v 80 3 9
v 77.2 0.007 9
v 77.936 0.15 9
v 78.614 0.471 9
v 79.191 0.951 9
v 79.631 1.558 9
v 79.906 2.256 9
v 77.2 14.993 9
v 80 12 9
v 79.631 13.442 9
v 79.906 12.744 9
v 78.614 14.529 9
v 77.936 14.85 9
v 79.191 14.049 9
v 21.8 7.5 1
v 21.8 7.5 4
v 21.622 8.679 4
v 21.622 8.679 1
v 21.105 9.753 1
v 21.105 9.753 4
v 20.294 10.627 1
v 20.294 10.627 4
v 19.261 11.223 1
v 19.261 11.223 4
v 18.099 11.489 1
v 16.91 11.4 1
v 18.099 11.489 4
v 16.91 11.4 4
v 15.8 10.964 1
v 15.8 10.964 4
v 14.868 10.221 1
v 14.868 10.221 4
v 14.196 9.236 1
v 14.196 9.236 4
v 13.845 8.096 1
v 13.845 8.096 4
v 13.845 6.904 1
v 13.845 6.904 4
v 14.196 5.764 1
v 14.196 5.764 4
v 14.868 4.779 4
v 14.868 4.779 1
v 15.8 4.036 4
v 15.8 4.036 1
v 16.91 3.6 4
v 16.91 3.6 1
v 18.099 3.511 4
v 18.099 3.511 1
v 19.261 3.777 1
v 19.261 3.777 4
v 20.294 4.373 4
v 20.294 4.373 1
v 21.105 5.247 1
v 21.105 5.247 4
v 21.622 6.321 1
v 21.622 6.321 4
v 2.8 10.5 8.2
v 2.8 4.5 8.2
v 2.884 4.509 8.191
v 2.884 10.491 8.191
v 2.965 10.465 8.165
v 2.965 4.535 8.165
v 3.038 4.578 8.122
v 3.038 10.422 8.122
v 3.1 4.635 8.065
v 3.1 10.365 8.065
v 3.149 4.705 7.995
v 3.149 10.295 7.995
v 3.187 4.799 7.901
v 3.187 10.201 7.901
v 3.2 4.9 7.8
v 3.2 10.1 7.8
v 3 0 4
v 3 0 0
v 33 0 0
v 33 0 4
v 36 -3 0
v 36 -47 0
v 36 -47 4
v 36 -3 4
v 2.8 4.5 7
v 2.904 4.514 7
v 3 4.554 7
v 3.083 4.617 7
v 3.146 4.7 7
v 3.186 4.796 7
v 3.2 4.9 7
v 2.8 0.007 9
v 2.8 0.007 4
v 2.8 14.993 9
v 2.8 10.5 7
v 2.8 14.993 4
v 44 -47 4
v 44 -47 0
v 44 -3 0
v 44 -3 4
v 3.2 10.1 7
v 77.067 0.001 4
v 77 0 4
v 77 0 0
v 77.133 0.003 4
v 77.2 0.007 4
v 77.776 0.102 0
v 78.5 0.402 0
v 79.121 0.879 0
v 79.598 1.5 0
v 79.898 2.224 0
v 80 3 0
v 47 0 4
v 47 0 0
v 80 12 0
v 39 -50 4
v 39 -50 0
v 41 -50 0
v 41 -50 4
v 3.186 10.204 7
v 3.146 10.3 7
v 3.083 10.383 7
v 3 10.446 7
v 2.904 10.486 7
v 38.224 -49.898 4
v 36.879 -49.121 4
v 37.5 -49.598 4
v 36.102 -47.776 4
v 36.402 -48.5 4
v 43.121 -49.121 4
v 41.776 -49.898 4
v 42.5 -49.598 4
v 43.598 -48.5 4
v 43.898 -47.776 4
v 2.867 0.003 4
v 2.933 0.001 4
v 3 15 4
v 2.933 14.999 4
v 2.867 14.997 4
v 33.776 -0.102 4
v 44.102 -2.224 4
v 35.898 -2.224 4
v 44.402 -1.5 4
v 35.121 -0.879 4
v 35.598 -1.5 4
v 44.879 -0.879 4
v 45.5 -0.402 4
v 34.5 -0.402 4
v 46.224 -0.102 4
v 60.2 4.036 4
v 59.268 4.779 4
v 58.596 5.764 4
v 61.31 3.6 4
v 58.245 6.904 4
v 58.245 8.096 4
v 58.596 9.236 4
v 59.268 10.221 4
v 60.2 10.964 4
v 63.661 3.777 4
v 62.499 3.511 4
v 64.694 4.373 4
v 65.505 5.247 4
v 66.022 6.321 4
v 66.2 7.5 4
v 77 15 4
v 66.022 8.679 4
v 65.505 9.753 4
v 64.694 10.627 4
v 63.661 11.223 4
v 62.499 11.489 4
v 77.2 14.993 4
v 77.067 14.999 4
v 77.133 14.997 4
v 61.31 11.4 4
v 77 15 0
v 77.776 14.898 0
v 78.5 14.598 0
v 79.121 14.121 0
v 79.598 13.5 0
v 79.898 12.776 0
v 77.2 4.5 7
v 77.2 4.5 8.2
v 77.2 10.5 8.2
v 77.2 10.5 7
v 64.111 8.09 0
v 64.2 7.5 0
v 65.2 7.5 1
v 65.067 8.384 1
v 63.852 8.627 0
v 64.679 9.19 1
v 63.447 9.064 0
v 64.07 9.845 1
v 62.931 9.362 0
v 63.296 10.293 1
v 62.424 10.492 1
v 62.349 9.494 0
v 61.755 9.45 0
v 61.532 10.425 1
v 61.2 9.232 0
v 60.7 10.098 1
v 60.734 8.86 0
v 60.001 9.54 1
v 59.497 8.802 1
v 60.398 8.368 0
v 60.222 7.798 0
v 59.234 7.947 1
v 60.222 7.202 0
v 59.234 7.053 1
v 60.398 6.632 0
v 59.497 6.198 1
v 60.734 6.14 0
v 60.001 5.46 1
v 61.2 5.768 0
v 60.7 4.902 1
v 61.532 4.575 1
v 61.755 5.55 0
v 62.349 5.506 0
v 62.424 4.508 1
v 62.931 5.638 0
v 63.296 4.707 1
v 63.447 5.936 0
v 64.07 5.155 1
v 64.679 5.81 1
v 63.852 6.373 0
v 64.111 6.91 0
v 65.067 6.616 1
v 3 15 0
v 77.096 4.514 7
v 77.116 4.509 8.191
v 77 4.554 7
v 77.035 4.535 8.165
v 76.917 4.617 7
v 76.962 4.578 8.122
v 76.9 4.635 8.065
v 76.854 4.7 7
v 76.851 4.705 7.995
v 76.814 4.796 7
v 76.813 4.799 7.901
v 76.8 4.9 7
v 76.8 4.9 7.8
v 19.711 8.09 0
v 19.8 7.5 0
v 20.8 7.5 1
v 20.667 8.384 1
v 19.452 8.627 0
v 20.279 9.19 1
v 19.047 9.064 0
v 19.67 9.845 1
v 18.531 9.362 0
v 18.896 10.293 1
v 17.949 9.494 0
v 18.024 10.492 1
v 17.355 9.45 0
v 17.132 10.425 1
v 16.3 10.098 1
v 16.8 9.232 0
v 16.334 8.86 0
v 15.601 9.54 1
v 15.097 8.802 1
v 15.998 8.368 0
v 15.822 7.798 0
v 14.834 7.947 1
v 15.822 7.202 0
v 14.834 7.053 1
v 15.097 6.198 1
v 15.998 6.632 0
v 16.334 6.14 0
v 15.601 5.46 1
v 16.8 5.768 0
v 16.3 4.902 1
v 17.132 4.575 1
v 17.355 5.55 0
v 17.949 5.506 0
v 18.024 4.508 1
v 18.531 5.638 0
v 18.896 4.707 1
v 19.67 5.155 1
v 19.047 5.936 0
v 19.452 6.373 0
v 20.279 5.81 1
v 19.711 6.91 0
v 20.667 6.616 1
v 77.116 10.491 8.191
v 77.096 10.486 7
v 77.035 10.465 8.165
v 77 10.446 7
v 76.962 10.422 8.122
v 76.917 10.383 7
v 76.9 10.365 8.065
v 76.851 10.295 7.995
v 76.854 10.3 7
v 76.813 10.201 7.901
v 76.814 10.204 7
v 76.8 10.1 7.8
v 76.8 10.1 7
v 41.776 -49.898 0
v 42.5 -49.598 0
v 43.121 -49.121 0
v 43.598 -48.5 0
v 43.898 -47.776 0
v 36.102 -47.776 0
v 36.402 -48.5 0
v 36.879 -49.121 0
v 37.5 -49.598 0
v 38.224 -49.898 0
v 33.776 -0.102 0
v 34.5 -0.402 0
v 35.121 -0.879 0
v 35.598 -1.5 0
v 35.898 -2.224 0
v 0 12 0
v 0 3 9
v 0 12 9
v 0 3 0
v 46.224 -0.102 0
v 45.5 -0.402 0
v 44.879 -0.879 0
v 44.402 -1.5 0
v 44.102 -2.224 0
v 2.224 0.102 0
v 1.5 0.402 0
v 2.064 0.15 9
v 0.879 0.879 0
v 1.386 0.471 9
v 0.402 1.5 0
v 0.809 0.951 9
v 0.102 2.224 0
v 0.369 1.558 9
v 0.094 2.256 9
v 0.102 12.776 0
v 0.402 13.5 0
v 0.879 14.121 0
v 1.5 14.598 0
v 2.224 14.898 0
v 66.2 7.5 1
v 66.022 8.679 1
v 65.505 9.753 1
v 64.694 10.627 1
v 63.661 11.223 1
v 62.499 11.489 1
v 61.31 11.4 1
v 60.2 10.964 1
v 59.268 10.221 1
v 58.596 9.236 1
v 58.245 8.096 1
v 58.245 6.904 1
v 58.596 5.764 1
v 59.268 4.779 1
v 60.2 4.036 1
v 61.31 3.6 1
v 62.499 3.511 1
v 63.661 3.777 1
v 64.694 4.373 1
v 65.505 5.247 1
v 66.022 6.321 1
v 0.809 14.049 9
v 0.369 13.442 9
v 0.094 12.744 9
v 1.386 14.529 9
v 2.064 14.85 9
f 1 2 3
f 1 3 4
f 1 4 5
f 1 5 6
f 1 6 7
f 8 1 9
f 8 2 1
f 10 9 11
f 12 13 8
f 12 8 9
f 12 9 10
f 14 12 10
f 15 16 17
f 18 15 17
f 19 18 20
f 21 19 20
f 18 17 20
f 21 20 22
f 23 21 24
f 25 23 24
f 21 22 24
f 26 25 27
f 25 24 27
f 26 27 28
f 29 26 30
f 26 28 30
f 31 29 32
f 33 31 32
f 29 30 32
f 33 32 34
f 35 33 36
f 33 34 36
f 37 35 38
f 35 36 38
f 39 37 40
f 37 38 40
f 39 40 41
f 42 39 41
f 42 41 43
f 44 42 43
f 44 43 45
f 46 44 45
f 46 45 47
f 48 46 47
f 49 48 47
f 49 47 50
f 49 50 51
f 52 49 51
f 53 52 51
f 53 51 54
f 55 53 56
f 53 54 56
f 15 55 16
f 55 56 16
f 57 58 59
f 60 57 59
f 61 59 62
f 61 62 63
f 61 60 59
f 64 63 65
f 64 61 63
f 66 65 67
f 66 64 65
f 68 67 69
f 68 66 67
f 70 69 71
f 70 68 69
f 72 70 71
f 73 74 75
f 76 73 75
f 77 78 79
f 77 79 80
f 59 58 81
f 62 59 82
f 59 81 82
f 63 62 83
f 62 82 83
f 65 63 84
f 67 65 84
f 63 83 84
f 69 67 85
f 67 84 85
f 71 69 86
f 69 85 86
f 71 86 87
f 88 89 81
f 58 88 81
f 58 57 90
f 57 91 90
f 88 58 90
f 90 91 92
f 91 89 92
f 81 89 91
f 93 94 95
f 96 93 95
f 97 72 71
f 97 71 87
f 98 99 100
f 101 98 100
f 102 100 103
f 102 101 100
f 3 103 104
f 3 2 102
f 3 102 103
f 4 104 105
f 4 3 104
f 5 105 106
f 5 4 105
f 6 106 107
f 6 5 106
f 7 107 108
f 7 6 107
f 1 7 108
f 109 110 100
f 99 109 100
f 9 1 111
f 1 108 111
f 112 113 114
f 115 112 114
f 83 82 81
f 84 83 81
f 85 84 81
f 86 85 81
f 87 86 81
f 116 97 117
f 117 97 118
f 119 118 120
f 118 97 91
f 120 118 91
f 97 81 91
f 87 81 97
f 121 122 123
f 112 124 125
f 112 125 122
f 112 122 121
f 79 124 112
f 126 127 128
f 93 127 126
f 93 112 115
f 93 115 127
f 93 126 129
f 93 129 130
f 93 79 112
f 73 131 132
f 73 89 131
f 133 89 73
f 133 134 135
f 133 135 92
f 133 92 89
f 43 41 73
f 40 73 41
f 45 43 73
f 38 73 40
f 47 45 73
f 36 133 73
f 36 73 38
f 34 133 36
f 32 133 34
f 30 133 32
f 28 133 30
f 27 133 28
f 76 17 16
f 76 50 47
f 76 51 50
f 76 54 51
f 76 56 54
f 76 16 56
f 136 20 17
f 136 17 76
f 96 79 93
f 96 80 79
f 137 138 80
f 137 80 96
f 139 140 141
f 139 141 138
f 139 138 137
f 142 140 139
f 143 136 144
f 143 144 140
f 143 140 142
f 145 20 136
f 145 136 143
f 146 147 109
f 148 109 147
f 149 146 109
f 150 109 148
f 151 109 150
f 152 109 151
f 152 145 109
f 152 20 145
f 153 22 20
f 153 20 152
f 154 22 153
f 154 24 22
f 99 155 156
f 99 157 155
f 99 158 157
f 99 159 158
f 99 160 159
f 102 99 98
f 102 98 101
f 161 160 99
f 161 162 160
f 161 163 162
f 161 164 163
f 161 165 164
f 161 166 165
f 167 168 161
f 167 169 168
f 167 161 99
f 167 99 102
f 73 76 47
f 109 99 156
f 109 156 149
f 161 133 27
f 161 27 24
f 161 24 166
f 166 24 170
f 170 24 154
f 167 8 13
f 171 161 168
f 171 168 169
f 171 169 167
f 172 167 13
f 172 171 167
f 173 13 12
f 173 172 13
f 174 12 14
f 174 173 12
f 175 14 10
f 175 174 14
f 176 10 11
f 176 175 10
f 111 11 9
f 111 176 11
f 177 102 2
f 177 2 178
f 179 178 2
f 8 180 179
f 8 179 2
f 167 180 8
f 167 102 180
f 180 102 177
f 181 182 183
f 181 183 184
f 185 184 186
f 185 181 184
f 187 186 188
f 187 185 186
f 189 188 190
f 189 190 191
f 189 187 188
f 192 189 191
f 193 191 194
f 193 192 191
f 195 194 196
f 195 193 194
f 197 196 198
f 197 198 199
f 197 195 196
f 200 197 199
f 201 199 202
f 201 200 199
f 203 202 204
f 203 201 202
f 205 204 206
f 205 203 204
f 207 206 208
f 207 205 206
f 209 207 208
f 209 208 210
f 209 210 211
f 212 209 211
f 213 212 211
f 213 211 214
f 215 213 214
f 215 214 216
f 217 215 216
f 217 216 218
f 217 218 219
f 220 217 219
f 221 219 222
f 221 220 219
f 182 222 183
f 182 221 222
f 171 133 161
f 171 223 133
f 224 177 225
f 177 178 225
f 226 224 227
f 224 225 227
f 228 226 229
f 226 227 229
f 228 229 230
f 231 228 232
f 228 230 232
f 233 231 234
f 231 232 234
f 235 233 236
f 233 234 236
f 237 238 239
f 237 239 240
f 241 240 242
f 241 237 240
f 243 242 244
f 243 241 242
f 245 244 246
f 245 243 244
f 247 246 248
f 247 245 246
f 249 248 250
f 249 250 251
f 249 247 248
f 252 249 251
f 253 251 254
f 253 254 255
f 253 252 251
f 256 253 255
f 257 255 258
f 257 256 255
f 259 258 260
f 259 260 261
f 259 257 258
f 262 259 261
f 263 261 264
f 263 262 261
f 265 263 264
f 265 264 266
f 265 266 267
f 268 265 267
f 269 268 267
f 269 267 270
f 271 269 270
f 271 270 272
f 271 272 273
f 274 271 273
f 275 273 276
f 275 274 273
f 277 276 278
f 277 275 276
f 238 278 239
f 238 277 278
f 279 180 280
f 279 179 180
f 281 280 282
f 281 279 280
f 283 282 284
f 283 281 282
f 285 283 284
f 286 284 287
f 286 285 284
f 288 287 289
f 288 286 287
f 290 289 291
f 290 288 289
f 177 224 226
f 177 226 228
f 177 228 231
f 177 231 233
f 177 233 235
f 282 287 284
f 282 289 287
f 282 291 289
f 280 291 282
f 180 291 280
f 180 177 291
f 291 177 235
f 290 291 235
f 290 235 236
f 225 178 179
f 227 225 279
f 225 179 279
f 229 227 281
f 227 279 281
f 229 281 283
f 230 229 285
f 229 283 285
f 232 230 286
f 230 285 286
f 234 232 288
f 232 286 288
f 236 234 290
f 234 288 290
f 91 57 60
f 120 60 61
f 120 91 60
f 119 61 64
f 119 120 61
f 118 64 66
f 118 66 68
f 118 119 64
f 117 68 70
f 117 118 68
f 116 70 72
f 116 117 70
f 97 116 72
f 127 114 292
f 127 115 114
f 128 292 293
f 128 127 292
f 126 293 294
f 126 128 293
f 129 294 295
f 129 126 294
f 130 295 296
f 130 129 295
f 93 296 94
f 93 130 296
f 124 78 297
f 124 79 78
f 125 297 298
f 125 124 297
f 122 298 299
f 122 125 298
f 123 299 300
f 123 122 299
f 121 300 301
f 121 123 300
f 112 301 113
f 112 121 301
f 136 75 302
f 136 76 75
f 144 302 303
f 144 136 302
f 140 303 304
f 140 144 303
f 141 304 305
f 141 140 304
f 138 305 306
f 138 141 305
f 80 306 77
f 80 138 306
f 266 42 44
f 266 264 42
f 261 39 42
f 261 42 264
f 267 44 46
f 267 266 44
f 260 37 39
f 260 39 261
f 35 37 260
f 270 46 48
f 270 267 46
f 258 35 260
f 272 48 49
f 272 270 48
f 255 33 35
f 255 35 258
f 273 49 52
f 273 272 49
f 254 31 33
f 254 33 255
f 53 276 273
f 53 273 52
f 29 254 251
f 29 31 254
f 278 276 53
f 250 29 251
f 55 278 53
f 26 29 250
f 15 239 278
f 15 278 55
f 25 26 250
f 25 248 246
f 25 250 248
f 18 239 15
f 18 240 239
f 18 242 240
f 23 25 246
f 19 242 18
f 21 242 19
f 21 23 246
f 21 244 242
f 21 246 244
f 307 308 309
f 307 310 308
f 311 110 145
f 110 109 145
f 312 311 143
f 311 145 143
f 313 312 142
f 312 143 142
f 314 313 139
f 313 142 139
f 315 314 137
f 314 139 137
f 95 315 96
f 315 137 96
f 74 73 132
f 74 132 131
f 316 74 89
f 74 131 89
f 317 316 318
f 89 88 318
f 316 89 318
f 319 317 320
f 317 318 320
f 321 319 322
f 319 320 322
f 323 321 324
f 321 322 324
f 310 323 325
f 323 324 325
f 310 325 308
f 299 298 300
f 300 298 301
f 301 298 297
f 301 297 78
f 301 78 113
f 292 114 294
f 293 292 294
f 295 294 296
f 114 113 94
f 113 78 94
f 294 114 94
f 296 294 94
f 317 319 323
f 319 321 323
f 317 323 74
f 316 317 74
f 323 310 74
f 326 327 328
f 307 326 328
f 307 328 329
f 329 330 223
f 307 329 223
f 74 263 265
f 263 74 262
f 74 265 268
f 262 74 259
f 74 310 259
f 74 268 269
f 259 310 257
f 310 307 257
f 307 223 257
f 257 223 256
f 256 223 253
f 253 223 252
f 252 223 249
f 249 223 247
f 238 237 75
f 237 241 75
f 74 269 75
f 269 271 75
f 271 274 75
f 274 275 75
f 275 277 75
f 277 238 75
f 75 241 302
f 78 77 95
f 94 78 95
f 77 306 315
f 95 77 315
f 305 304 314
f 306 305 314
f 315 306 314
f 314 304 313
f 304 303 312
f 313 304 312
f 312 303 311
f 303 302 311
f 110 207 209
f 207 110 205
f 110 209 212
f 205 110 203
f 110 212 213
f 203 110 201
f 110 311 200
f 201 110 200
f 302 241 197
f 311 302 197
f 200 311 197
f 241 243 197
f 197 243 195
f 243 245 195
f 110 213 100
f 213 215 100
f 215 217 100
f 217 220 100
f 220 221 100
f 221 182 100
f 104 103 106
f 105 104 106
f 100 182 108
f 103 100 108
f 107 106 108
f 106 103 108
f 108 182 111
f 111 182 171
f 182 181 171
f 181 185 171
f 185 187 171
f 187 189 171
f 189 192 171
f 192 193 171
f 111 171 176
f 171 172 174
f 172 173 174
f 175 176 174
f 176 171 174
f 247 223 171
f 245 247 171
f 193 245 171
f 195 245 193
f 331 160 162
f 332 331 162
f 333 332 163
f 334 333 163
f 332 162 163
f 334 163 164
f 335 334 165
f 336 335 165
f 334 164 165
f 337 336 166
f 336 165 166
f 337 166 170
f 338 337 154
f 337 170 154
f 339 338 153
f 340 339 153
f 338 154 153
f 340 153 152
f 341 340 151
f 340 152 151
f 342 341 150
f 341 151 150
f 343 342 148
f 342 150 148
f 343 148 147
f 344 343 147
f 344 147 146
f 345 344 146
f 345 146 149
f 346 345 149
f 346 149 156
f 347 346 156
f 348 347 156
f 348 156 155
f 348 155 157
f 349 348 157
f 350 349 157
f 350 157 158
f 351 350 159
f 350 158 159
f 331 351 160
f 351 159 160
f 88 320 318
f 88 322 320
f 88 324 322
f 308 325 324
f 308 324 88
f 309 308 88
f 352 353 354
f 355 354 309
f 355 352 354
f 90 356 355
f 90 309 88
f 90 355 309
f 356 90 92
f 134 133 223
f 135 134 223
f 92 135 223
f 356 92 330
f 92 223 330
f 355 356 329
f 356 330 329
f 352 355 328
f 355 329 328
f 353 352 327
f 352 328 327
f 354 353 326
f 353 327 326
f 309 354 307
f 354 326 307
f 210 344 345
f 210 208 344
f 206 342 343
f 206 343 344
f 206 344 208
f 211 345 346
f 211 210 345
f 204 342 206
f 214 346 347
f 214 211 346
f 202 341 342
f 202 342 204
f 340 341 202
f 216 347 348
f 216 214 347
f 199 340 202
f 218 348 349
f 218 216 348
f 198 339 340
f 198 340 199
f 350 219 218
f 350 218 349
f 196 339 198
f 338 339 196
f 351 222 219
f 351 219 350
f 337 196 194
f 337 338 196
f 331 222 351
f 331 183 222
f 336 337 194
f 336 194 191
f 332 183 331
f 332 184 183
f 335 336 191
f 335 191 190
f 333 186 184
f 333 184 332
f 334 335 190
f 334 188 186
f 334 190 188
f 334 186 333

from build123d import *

# Parameters (mm, degrees)
SKETCH1_W           = 80
SKETCH1_H           = 15
BOSS_EXTRUDE1_DEPTH = 4
SKETCH2_W           = 2.8
SKETCH2_H           = 15
BOSS_EXTRUDE2_DEPTH = 5
SKETCH3_W           = 1.2
SKETCH3_H           = 6
BOSS_EXTRUDE3_DEPTH = 0.4
SKETCH4_W           = 1.2
SKETCH4_H           = 6
BOSS_EXTRUDE4_DEPTH = 0.4
FILLET1_R           = 0.4
FILLET2_R           = 3
SKETCH5_W           = 8
SKETCH5_H           = 50
BOSS_EXTRUDE5_DEPTH = 4
FILLET3_R           = 3
SKETCH6_R           = 4
CUT_EXTRUDE1_DEPTH  = 3
SKETCH7_R           = 2
CUT_EXTRUDE2_DEPTH  = 3
CHAMFER1_SIZE       = 1


with BuildPart() as part:
    # Sketch1 → Boss-Extrude1 (new body)
    with BuildSketch(Plane.XY):
        with Locations((40, 7.5)):
            Rectangle(SKETCH1_W, SKETCH1_H)
    extrude(amount=BOSS_EXTRUDE1_DEPTH)

    # Sketch2 → Boss-Extrude2 (add)
    with BuildSketch(Plane.XY.offset(4)):
        with Locations((1.4, 7.5)):
            Rectangle(SKETCH2_W, SKETCH2_H)
        with Locations((78.6, 7.5)):
            Rectangle(SKETCH2_W, SKETCH2_H)
    extrude(amount=BOSS_EXTRUDE2_DEPTH)

    # Sketch3 → Boss-Extrude3 (add)
    with BuildSketch(Plane(origin=(2.8, 0, 0), x_dir=(0, 0, -1), z_dir=(1, 0, 0))):
        with Locations((-7.6, 7.5)):
            Rectangle(SKETCH3_W, SKETCH3_H)
    extrude(amount=BOSS_EXTRUDE3_DEPTH)

    # Sketch4 → Boss-Extrude4 (add)
    with BuildSketch(Plane.ZY.offset(-77.2)):
        with Locations((7.6, 7.5)):
            Rectangle(SKETCH4_W, SKETCH4_H)
    extrude(amount=BOSS_EXTRUDE4_DEPTH)

    # Fillet1
    fillet1_edges = [part.edges().sort_by_distance(p)[0] for p in [
        (3.2, 10.5, 7.6),
        (3.2, 4.5, 7.6),
        (76.8, 10.5, 7.6),
        (76.8, 4.5, 7.6),
        (76.8, 7.5, 8.2),
        (3.2, 7.5, 8.2),
    ]]
    fillet(fillet1_edges, radius=FILLET1_R - 0.0001)  # a hair under: the kernel refuses the full size

    # Fillet2
    fillet2_edges = [part.edges().sort_by_distance(p)[0] for p in [
        (80, 0, 4.5),
        (80, 15, 4.5),
        (0, 0, 4.5),
        (0, 15, 4.5),
    ]]
    fillet(fillet2_edges, radius=FILLET2_R)

    # Sketch5 → Boss-Extrude5 (add)
    with BuildSketch(Plane.XY):
        with Locations((40, -25)):
            Rectangle(SKETCH5_W, SKETCH5_H)
    extrude(amount=BOSS_EXTRUDE5_DEPTH)

    # Fillet3
    fillet3_edges = [part.edges().sort_by_distance(p)[0] for p in [
        (36, 0, 2),
        (36, -50, 2),
        (44, -50, 2),
        (44, 0, 2),
    ]]
    fillet(fillet3_edges, radius=FILLET3_R)

    # Sketch6 → Cut-Extrude1 (cut)
    with BuildSketch(Plane.XY.offset(4)):
        with Locations((17.8, 7.5)):
            Circle(SKETCH6_R)
        with Locations((62.2, 7.5)):
            Circle(SKETCH6_R)
    extrude(amount=-CUT_EXTRUDE1_DEPTH, mode=Mode.SUBTRACT)

    # Sketch7 → Cut-Extrude2 (cut)
    with BuildSketch(Plane.XY.offset(1)):
        with Locations((17.8, 7.5)):
            Circle(SKETCH7_R)
        with Locations((62.2, 7.5)):
            Circle(SKETCH7_R)
    extrude(amount=-CUT_EXTRUDE2_DEPTH, mode=Mode.SUBTRACT)

    # Chamfer1
    chamfer1_edges = [part.edges().sort_by_distance(p)[0] for p in [
        (15.8, 7.5, 1),
        (60.2, 7.5, 1),
    ]]
    chamfer(chamfer1_edges, length=CHAMFER1_SIZE - 0.0001)  # a hair under: the kernel refuses the full size


solid = part.part
